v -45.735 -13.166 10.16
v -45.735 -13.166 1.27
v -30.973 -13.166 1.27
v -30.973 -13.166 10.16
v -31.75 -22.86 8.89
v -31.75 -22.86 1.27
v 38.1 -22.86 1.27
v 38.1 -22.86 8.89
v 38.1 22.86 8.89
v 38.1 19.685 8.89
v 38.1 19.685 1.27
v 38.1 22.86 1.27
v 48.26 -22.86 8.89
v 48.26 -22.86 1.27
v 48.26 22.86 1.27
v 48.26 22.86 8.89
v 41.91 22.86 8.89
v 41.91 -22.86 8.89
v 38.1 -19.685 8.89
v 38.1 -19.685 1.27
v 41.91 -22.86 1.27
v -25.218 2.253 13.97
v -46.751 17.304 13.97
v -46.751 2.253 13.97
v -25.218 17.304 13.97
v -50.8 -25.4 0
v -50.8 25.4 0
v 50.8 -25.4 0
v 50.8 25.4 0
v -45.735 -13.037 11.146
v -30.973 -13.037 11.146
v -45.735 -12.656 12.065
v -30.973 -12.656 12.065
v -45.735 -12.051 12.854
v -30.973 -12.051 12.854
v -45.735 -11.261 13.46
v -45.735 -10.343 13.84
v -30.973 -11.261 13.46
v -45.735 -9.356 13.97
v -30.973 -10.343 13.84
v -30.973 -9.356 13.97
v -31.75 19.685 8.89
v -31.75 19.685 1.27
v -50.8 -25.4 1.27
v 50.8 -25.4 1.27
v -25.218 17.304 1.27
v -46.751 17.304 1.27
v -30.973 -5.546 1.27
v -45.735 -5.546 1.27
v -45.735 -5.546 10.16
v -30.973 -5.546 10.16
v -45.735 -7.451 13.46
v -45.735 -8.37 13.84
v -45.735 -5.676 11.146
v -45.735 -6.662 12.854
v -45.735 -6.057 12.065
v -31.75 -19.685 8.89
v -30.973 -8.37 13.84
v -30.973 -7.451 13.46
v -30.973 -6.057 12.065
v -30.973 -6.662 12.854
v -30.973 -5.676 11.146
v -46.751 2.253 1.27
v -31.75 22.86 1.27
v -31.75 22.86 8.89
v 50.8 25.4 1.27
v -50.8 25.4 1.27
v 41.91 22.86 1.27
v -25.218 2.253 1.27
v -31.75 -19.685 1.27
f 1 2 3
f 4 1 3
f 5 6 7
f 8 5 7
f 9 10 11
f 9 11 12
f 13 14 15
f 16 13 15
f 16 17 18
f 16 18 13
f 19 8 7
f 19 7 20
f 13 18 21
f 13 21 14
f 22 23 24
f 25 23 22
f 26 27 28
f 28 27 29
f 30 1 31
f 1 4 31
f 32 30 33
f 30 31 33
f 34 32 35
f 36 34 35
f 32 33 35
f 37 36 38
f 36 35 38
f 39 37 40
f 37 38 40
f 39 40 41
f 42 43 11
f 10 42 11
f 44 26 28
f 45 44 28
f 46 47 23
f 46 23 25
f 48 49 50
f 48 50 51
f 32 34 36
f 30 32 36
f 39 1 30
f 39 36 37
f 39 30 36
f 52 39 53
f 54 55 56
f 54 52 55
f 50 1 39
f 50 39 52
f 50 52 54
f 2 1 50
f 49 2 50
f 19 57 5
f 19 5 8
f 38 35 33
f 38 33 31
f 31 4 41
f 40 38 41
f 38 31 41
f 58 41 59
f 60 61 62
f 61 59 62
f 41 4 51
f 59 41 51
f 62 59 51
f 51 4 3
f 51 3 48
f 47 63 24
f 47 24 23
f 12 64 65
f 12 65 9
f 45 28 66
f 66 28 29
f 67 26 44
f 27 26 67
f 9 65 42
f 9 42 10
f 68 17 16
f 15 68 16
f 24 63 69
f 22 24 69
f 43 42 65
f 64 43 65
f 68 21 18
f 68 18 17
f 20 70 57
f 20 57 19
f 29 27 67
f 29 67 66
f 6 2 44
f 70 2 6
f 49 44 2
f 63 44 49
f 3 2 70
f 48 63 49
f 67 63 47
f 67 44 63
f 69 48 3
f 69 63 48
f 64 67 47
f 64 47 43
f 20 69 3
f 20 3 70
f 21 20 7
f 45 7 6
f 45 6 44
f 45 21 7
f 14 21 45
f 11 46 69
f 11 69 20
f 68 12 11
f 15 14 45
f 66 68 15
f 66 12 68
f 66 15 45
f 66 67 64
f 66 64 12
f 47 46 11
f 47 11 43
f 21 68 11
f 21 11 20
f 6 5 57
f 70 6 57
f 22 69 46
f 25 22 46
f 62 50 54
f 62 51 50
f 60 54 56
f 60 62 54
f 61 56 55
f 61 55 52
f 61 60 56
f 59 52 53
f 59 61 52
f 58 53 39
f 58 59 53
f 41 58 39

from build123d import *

# Parameters (mm, degrees)
F0_W     = 101.6
F0_H     = 50.8
F1_DEPTH = 1.27
F2_W     = 69.85
F2_H     = 3.175
F2_W_2   = 6.35
F2_H_2   = 45.72
F3_DEPTH = 7.62
F4_W     = 21.532409323
F4_H     = 15.0506472416
F4_W_2   = 14.7617278114
F4_H_2   = 7.62
F5_DEPTH = 12.7
F6_R     = 3.80999


# Not quite as in the source:
# - a fillet or chamfer is up to 0.001 mm smaller than in the source, because OpenCascade refuses the exact size


with BuildPart() as f1:
    # F0 (on Top) → F1 (new body)
    with BuildSketch(Plane.XY):
        Rectangle(F0_W, F0_H)
    extrude(amount=F1_DEPTH)

    # F2 (on face) → F3 (join)
    with BuildSketch(Plane.XY.offset(1.27)):
        with Locations((3.175, 21.2725)):
            Rectangle(F2_W, F2_H)
        with Locations((45.085, 0)):
            Rectangle(F2_W_2, F2_H_2)
        with Locations((3.175, -21.2725)):
            Rectangle(F2_W, F2_H)
    extrude(amount=F3_DEPTH)

    # F4 (on face) → F5 (join)
    with BuildSketch(Plane.XY.offset(1.27)):
        with Locations((-35.9846150789, 9.7787969645)):
            Rectangle(F4_W, F4_H)
        with Locations((-38.3539574899, -9.3564780889)):
            Rectangle(F4_W_2, F4_H_2)
    extrude(amount=F5_DEPTH)

    # F6 (radius 3.81 in the source; OpenCascade refuses exactly that, so slightly less here)
    f6_edges = [f1.edges().sort_by_distance(p)[0] for p in [
        (-38.353957, -13.166478, 13.97),
        (-38.353957, -5.546478, 13.97),
    ]]
    fillet(f6_edges, radius=F6_R)


solid = f1.part
